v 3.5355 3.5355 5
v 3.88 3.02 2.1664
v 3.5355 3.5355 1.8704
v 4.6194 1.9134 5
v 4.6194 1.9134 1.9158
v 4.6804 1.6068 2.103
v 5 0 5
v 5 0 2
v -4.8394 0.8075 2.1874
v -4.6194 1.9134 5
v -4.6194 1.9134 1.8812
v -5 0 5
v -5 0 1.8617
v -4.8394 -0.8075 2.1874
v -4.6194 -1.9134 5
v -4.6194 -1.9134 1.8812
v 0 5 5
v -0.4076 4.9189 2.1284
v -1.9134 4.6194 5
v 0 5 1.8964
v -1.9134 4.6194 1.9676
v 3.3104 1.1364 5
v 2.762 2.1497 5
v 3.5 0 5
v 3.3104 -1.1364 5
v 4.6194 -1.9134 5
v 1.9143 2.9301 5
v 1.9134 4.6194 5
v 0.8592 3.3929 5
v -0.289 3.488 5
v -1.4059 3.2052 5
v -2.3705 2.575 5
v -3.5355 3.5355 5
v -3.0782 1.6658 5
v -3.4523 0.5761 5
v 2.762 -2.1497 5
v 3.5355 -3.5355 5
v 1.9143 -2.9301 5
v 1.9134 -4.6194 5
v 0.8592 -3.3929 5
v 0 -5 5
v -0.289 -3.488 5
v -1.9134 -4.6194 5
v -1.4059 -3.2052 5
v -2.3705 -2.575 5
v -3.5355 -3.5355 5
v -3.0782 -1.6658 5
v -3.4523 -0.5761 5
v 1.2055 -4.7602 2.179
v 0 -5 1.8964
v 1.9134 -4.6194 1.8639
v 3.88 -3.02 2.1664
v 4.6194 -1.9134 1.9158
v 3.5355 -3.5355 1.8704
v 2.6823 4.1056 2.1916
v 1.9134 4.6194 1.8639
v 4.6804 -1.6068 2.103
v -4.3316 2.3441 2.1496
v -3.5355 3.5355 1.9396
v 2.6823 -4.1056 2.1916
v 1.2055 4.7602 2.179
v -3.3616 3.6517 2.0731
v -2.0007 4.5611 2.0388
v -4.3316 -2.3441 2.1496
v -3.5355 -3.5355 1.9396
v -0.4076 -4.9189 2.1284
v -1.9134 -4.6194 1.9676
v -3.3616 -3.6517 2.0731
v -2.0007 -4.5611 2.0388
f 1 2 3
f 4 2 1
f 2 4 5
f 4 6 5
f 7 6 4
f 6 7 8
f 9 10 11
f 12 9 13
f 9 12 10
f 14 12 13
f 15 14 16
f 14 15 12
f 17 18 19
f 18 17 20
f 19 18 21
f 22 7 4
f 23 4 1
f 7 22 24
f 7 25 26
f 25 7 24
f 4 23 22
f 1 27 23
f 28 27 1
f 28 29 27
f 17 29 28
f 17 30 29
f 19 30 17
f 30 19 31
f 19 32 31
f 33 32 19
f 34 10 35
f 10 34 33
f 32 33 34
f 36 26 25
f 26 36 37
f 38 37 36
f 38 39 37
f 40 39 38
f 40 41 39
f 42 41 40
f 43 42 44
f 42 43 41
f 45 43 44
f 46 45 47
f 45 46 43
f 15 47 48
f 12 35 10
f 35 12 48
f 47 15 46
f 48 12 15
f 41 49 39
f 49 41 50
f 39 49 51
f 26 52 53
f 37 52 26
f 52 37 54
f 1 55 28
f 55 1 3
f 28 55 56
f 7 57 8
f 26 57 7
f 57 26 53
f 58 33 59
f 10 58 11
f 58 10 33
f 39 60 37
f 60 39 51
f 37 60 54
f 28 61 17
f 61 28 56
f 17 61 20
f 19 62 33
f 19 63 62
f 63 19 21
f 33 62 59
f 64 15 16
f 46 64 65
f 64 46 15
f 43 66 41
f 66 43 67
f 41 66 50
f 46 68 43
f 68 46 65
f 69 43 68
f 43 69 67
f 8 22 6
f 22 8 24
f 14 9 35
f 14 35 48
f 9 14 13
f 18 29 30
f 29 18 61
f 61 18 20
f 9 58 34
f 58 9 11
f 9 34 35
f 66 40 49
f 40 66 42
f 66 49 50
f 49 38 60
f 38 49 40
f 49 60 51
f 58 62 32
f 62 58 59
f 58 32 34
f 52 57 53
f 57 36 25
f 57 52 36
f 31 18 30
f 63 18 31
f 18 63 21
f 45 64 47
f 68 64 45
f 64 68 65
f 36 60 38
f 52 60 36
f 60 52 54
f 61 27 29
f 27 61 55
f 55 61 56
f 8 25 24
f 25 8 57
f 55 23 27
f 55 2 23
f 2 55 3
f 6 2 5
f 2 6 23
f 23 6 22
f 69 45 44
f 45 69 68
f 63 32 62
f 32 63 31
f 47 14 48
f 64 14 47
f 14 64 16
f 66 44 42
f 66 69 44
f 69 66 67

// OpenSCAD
x=5;
difference() {
	cylinder(x,x,x);
	cylinder(12,6,0) ;

};
